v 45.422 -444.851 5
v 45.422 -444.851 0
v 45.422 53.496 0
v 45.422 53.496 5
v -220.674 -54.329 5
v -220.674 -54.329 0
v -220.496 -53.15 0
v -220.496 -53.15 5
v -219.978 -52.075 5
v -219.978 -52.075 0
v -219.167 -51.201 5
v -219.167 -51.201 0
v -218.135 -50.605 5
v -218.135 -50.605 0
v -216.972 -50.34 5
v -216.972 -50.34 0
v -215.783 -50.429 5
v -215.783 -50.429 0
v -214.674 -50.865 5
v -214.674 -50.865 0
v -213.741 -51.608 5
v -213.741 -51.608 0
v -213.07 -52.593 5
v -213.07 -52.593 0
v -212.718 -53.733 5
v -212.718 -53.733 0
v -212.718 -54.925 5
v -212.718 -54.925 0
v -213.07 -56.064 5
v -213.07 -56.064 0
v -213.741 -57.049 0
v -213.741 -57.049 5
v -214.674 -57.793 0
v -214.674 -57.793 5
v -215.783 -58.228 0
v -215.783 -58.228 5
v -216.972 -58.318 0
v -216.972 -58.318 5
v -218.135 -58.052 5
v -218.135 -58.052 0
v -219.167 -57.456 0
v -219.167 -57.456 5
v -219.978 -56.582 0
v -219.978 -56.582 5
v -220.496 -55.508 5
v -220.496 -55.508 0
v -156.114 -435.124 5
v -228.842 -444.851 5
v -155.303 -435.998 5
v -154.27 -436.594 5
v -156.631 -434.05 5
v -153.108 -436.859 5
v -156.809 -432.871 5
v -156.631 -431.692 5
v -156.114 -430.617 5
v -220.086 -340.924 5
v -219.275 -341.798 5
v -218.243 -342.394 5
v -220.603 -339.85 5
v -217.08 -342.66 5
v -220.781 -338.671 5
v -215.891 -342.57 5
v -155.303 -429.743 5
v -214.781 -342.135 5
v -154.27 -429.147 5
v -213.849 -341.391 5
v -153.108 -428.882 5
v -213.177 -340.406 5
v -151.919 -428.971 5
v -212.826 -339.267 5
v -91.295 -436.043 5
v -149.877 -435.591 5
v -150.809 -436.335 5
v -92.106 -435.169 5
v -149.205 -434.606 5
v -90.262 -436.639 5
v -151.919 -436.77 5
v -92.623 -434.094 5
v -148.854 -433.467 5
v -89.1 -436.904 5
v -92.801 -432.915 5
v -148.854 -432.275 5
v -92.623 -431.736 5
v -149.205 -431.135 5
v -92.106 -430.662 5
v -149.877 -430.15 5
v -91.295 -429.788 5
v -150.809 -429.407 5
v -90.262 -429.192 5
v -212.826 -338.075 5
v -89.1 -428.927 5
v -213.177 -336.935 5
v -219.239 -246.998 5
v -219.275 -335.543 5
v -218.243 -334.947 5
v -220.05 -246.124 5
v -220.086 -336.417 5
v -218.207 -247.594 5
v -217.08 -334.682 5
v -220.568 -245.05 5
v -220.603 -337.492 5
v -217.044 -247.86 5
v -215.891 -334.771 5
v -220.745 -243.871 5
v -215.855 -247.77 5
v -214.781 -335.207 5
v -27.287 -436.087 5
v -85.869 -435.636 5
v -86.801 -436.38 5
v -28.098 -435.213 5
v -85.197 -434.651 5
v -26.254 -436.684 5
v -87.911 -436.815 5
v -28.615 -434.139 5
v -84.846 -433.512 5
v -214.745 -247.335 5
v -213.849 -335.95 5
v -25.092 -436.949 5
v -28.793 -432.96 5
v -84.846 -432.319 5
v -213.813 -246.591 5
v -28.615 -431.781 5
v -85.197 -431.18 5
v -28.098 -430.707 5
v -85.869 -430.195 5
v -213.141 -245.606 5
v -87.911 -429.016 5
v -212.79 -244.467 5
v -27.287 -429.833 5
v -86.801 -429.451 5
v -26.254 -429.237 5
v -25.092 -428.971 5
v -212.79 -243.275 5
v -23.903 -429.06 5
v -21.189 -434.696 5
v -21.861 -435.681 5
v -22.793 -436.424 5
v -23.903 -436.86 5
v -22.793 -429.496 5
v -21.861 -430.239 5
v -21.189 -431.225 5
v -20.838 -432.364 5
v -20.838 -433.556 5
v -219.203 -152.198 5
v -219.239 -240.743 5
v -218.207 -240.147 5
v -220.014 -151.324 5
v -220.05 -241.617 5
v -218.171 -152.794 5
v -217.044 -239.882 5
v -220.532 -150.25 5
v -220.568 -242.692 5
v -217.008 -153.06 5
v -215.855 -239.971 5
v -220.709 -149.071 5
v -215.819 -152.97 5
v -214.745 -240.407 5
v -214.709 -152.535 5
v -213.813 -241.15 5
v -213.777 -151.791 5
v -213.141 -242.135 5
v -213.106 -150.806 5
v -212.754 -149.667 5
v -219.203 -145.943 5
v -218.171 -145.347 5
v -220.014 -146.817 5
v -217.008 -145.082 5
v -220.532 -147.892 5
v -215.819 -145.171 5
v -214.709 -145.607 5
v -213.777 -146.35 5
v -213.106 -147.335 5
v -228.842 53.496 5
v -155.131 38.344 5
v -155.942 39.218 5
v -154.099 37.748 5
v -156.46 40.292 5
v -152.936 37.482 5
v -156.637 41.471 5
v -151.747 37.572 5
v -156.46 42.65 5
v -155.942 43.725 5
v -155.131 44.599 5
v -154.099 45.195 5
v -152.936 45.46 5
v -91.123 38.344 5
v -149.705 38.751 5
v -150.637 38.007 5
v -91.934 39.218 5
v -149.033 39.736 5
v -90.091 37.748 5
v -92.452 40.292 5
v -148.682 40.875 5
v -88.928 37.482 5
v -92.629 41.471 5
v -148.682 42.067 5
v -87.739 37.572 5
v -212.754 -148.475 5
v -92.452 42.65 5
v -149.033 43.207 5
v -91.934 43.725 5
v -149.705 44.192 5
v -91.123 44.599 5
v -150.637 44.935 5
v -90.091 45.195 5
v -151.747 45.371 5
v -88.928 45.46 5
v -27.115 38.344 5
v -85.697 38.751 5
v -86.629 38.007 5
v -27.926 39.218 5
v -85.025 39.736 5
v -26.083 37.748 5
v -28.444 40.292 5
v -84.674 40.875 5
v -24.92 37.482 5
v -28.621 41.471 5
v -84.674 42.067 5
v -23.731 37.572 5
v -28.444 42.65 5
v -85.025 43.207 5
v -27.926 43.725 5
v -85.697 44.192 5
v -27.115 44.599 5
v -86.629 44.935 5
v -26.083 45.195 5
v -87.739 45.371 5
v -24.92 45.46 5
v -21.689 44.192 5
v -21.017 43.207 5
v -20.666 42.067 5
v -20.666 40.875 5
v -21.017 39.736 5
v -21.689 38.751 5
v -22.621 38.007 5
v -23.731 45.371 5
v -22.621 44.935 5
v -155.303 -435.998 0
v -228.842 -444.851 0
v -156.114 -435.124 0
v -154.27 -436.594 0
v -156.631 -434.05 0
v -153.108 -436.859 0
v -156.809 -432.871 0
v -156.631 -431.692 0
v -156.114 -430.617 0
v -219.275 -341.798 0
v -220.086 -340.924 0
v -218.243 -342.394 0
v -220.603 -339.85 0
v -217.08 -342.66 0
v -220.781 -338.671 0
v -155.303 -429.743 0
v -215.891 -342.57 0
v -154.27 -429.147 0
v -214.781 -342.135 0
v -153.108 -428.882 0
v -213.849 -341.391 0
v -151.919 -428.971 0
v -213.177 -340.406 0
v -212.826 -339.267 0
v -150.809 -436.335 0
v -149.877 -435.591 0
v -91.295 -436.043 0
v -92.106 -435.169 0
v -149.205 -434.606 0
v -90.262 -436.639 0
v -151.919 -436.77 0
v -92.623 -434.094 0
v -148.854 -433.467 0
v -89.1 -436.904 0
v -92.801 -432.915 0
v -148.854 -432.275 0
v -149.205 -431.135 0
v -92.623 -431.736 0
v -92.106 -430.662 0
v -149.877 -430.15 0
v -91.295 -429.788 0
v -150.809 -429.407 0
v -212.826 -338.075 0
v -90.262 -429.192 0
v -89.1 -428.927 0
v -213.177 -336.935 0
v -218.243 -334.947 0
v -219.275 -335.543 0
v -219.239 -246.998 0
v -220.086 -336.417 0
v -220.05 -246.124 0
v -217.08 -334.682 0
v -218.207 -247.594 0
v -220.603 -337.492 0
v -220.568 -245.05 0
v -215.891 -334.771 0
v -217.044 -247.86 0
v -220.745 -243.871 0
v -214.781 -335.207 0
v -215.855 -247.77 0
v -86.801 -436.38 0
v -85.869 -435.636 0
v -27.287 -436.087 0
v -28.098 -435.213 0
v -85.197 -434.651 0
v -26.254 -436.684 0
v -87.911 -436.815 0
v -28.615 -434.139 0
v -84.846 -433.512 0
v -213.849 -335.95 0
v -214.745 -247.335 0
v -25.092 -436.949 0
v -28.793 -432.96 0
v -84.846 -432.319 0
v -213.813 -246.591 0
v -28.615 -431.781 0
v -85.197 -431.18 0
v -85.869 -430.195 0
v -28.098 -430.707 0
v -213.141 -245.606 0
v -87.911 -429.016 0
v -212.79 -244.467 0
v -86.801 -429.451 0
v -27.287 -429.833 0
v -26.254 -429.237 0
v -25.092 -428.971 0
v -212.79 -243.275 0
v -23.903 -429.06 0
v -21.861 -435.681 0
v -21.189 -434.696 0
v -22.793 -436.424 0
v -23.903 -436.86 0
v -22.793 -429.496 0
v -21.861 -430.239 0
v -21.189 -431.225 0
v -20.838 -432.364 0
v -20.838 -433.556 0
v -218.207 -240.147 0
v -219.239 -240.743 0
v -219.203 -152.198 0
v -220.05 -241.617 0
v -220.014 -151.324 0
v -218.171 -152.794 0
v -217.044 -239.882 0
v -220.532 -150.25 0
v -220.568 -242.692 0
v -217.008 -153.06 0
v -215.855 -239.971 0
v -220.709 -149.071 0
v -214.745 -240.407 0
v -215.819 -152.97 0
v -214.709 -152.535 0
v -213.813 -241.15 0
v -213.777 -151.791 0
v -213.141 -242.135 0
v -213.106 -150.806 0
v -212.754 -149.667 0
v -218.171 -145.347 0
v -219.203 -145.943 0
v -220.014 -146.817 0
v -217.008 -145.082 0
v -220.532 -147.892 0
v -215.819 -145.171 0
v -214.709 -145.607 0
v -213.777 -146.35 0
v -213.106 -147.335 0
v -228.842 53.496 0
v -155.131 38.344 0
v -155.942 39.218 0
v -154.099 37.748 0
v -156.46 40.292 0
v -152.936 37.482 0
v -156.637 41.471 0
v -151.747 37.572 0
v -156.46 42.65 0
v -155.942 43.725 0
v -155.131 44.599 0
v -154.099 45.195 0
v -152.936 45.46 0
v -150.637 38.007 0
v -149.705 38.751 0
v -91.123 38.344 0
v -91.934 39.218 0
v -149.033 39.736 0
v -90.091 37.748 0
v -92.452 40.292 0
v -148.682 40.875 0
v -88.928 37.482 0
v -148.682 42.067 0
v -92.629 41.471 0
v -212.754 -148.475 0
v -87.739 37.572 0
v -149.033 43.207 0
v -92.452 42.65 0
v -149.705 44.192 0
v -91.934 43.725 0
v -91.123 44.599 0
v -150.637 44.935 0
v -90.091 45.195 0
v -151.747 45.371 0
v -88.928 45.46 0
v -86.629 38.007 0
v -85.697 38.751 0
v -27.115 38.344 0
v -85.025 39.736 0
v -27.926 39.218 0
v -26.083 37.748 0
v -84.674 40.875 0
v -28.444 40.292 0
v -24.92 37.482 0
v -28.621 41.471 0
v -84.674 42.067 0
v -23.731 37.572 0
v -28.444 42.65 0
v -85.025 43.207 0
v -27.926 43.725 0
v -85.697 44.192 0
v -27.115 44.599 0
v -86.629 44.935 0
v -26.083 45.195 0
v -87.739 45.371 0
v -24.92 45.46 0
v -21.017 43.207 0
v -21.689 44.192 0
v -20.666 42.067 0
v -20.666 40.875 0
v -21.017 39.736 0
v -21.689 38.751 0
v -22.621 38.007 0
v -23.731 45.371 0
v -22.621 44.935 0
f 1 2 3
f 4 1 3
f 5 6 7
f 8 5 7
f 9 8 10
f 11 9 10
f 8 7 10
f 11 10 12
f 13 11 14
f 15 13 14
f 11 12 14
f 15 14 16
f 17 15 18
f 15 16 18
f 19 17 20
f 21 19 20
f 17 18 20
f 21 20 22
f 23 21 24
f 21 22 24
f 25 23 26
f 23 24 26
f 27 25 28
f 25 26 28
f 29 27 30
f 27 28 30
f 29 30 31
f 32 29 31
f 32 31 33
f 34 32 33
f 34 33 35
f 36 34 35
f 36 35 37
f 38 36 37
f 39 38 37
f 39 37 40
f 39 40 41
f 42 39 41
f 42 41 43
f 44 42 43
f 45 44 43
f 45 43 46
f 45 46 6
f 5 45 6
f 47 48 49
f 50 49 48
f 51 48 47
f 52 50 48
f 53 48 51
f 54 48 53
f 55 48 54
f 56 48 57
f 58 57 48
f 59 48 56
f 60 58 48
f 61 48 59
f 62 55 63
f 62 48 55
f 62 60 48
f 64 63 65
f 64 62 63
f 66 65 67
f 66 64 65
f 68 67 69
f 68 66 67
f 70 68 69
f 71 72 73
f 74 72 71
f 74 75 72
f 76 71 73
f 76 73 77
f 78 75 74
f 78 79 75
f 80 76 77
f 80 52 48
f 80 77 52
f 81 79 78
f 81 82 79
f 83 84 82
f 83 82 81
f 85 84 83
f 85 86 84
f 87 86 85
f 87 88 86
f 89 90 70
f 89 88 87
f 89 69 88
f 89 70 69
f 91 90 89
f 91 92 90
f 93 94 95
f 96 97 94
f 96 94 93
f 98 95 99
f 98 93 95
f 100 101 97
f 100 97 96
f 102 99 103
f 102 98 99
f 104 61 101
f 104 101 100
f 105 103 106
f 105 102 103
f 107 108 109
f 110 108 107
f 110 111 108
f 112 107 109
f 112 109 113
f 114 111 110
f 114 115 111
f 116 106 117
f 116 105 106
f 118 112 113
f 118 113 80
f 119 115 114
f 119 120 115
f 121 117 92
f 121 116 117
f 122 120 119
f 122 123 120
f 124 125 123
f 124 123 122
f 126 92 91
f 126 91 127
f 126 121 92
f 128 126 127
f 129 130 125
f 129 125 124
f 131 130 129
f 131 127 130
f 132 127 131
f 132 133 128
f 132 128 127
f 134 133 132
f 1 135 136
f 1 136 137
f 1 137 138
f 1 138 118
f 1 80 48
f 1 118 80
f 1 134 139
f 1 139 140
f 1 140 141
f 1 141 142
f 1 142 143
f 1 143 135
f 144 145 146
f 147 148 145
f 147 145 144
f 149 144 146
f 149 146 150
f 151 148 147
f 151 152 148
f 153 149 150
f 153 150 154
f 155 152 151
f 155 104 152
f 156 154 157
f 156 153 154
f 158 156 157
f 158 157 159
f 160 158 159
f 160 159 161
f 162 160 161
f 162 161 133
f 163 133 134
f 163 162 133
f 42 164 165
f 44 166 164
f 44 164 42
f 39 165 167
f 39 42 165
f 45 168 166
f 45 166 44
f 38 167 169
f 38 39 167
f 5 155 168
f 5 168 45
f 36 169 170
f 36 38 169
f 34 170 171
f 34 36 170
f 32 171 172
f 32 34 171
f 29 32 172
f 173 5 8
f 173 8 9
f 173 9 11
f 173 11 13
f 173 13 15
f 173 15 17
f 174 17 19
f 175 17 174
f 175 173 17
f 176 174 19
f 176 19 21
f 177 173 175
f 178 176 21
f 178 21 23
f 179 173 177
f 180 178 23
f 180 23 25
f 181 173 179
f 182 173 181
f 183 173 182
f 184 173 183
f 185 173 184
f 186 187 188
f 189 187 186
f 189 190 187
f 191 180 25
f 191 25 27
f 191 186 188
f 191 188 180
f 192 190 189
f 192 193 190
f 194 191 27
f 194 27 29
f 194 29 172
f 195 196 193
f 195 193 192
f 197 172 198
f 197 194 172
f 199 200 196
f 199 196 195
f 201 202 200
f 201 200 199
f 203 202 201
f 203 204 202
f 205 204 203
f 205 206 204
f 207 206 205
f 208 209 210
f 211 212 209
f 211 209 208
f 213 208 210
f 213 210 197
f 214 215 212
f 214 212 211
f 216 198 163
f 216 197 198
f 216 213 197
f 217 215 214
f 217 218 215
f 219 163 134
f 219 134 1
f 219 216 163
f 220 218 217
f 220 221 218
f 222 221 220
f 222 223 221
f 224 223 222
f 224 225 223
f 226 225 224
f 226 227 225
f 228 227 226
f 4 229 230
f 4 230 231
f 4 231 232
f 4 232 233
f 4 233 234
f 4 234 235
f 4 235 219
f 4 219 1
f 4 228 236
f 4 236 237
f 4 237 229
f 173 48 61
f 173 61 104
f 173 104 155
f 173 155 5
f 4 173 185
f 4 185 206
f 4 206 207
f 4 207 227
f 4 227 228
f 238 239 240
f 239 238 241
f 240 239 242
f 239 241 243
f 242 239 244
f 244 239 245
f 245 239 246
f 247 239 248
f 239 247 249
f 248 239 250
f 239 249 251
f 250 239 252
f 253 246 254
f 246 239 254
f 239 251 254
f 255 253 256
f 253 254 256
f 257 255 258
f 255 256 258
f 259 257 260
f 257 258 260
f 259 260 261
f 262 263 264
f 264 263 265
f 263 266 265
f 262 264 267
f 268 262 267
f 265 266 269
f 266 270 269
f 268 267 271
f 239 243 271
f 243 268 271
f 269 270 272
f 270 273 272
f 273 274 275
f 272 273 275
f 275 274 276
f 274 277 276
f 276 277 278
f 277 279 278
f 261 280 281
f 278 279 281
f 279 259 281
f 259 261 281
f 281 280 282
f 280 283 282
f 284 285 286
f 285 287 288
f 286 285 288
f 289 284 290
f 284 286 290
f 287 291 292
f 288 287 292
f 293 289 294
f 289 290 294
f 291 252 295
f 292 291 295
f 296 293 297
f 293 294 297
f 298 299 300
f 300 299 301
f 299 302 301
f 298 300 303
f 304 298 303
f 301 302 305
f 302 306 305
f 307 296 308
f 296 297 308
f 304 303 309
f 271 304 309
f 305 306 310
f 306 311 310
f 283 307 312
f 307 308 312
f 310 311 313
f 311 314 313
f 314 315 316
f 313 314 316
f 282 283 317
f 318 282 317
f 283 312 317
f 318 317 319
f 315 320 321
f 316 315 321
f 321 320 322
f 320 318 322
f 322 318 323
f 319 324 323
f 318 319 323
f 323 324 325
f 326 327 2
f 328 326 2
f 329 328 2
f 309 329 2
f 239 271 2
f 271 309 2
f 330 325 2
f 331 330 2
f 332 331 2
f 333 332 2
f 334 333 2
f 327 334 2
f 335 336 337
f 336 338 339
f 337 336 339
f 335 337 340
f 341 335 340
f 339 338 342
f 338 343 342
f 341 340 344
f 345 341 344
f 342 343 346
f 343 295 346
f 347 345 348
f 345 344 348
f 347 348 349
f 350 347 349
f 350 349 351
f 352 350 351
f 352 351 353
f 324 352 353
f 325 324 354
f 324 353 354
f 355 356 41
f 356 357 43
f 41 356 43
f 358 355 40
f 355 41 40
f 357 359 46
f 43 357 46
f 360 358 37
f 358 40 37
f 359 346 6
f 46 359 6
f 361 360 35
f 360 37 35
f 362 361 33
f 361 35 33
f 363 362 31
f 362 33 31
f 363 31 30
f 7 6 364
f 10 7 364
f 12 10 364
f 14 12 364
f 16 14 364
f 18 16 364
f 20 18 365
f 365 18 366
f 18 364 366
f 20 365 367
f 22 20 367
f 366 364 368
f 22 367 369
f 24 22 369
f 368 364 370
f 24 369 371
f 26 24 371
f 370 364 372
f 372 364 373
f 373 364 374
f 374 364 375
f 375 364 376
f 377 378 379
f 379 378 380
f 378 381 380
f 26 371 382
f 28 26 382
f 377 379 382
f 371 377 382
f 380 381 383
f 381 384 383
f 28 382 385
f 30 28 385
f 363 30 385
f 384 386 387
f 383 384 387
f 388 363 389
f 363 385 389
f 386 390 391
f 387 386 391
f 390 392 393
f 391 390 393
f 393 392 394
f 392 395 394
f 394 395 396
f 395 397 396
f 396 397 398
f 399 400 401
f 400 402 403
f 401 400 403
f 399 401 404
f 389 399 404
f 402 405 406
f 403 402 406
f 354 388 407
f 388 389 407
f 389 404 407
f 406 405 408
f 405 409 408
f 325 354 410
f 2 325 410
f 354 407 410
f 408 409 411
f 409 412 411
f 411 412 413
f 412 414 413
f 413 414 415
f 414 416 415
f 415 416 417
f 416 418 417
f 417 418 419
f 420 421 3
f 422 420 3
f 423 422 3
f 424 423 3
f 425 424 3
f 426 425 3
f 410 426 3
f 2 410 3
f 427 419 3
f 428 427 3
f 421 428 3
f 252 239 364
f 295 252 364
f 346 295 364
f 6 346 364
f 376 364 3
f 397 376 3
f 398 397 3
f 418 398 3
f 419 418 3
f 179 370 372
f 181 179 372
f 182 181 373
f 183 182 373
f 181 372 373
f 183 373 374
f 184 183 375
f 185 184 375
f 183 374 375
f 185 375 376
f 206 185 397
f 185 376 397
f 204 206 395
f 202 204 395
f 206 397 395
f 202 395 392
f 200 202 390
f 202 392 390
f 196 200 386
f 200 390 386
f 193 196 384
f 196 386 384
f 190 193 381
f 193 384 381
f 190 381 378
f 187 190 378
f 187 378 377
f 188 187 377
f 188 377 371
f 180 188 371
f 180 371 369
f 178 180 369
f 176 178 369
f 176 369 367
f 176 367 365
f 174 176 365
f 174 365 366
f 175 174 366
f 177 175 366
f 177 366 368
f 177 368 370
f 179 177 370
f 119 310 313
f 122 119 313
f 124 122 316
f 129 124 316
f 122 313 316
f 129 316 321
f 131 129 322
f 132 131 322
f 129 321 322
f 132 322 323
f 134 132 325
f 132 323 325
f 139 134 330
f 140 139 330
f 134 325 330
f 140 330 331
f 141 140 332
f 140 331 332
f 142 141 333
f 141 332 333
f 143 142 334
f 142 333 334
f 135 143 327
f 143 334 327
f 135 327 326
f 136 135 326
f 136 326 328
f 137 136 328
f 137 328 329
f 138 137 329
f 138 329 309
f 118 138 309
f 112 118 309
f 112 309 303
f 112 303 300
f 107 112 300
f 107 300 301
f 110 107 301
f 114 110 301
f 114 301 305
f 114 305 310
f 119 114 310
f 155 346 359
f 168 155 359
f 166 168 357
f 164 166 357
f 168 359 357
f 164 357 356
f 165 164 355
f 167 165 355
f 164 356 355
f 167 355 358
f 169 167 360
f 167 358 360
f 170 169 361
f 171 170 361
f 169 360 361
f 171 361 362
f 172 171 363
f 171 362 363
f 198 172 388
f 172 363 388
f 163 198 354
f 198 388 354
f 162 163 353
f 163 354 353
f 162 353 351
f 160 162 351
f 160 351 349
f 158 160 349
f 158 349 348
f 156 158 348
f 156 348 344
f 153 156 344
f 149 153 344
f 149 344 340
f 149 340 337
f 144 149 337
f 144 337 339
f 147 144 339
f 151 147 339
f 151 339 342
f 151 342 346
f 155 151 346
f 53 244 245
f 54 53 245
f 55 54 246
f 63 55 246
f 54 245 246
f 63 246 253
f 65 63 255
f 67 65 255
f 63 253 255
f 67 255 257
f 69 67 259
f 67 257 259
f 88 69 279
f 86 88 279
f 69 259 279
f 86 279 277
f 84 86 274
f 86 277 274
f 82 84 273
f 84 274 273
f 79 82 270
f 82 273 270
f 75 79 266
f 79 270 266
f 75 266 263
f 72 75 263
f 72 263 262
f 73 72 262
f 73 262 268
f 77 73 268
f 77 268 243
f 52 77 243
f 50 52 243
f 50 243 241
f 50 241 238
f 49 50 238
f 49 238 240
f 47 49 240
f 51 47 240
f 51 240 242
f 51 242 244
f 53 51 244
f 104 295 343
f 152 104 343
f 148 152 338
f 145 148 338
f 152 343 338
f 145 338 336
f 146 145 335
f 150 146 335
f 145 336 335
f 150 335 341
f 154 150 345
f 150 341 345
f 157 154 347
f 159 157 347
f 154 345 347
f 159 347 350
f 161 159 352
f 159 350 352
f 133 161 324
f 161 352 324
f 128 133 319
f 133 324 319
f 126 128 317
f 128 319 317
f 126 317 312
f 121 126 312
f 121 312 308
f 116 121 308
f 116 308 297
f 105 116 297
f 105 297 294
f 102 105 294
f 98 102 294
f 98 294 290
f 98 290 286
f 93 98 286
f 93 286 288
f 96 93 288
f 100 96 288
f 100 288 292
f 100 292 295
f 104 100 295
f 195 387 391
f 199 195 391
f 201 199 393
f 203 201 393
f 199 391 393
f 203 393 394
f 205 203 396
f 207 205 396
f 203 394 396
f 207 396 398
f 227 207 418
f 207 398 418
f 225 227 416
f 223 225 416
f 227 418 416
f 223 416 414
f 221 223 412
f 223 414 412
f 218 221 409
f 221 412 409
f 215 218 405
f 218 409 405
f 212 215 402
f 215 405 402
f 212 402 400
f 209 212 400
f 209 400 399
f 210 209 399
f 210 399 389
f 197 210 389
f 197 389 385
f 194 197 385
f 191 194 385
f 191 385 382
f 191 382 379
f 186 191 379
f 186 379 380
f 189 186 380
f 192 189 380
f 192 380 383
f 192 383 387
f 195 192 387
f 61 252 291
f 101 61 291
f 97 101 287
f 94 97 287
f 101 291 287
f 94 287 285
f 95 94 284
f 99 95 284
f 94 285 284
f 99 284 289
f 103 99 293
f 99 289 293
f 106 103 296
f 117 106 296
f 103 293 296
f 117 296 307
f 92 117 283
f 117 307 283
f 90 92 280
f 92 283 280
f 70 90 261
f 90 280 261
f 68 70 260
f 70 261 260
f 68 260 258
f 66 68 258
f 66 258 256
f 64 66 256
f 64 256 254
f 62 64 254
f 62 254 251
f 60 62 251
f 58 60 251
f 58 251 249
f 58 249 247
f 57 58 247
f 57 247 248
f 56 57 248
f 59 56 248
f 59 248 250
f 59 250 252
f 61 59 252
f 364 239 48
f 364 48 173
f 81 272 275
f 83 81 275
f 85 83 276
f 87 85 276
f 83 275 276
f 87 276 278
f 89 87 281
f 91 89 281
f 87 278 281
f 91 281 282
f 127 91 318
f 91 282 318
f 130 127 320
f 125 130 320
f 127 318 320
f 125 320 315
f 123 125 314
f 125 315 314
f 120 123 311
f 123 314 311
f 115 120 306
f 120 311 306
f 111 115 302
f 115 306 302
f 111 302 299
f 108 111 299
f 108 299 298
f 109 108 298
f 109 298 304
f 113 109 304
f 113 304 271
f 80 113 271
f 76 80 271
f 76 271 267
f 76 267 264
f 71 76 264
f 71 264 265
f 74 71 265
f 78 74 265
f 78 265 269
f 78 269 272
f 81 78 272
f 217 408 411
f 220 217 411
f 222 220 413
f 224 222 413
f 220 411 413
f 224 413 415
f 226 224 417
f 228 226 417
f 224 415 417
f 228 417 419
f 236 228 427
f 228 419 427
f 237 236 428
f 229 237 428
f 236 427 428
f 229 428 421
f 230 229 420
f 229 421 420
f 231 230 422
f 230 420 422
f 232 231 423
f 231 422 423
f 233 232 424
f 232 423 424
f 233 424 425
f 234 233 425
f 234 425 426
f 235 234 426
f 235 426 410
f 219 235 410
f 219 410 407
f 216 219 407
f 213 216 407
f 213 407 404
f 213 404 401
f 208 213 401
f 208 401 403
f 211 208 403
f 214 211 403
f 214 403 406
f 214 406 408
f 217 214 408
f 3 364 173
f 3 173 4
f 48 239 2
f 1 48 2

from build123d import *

# Parameters (mm, degrees)
BASE_FLANGE1_OUTLINE_W = 274.2634
BASE_FLANGE1_OUTLINE_H = 498.347194877
BASE_FLANGE1_DEPTH     = 5
CUT_EXTRUDE1_REACH     = 502.286
SKETCH6_R              = 4


# Read off the part's stored shape, not the designer's step: Base-Flange1
with BuildPart() as part:
    # Base-Flange1 outline → Base-Flange1 (new body)
    with BuildSketch(Plane.XY):
        with Locations((-91.710148042, -195.677360812)):
            Rectangle(BASE_FLANGE1_OUTLINE_W, BASE_FLANGE1_OUTLINE_H)
    extrude(amount=BASE_FLANGE1_DEPTH)

    # Sketch6 → Cut-Extrude1 (cut, up to next)
    with BuildSketch(Plane(origin=(0, 0, 0), x_dir=(-1, 0, 0), z_dir=(0, 0, -1)), mode=Mode.PRIVATE) as cut_extrude1_sk1:
        with Locations((152.63724292, 41.471236627)):
            Circle(SKETCH6_R)
    cut_extrude1_tool1 = extrude(cut_extrude1_sk1.sketch, amount=-CUT_EXTRUDE1_REACH, mode=Mode.PRIVATE) & part.part
    # Sketch6 → Cut-Extrude1 (cut, up to next)
    with BuildSketch(Plane(origin=(0, 0, 0), x_dir=(-1, 0, 0), z_dir=(0, 0, -1)), mode=Mode.PRIVATE) as cut_extrude1_sk2:
        with Locations((88.62924292, 41.471236627)):
            Circle(SKETCH6_R)
    cut_extrude1_tool2 = extrude(cut_extrude1_sk2.sketch, amount=-CUT_EXTRUDE1_REACH, mode=Mode.PRIVATE) & part.part
    # Sketch6 → Cut-Extrude1 (cut, up to next)
    with BuildSketch(Plane(origin=(0, 0, 0), x_dir=(-1, 0, 0), z_dir=(0, 0, -1)), mode=Mode.PRIVATE) as cut_extrude1_sk3:
        with Locations((24.62124292, 41.471236627)):
            Circle(SKETCH6_R)
    cut_extrude1_tool3 = extrude(cut_extrude1_sk3.sketch, amount=-CUT_EXTRUDE1_REACH, mode=Mode.PRIVATE) & part.part
    # Sketch6 → Cut-Extrude1 (cut, up to next)
    with BuildSketch(Plane(origin=(0, 0, 0), x_dir=(-1, 0, 0), z_dir=(0, 0, -1)), mode=Mode.PRIVATE) as cut_extrude1_sk4:
        with Locations((216.673520112, -54.328763373)):
            Circle(SKETCH6_R)
    cut_extrude1_tool4 = extrude(cut_extrude1_sk4.sketch, amount=-CUT_EXTRUDE1_REACH, mode=Mode.PRIVATE) & part.part
    # Sketch6 → Cut-Extrude1 (cut, up to next)
    with BuildSketch(Plane(origin=(0, 0, 0), x_dir=(-1, 0, 0), z_dir=(0, 0, -1)), mode=Mode.PRIVATE) as cut_extrude1_sk5:
        with Locations((216.709396665, -149.070763373)):
            Circle(SKETCH6_R)
    cut_extrude1_tool5 = extrude(cut_extrude1_sk5.sketch, amount=-CUT_EXTRUDE1_REACH, mode=Mode.PRIVATE) & part.part
    # Sketch6 → Cut-Extrude1 (cut, up to next)
    with BuildSketch(Plane(origin=(0, 0, 0), x_dir=(-1, 0, 0), z_dir=(0, 0, -1)), mode=Mode.PRIVATE) as cut_extrude1_sk6:
        with Locations((216.745295182, -243.870763373)):
            Circle(SKETCH6_R)
    cut_extrude1_tool6 = extrude(cut_extrude1_sk6.sketch, amount=-CUT_EXTRUDE1_REACH, mode=Mode.PRIVATE) & part.part
    # Sketch6 → Cut-Extrude1 (cut, up to next)
    with BuildSketch(Plane(origin=(0, 0, 0), x_dir=(-1, 0, 0), z_dir=(0, 0, -1)), mode=Mode.PRIVATE) as cut_extrude1_sk7:
        with Locations((216.781193698, -338.670763373)):
            Circle(SKETCH6_R)
    cut_extrude1_tool7 = extrude(cut_extrude1_sk7.sketch, amount=-CUT_EXTRUDE1_REACH, mode=Mode.PRIVATE) & part.part
    # Sketch6 → Cut-Extrude1 (cut, up to next)
    with BuildSketch(Plane(origin=(0, 0, 0), x_dir=(-1, 0, 0), z_dir=(0, 0, -1)), mode=Mode.PRIVATE) as cut_extrude1_sk8:
        with Locations((152.808848042, -432.870680177)):
            Circle(SKETCH6_R)
    cut_extrude1_tool8 = extrude(cut_extrude1_sk8.sketch, amount=-CUT_EXTRUDE1_REACH, mode=Mode.PRIVATE) & part.part
    # Sketch6 → Cut-Extrude1 (cut, up to next)
    with BuildSketch(Plane(origin=(0, 0, 0), x_dir=(-1, 0, 0), z_dir=(0, 0, -1)), mode=Mode.PRIVATE) as cut_extrude1_sk9:
        with Locations((88.800848042, -432.915402104)):
            Circle(SKETCH6_R)
    cut_extrude1_tool9 = extrude(cut_extrude1_sk9.sketch, amount=-CUT_EXTRUDE1_REACH, mode=Mode.PRIVATE) & part.part
    # Sketch6 → Cut-Extrude1 (cut, up to next)
    with BuildSketch(Plane(origin=(0, 0, 0), x_dir=(-1, 0, 0), z_dir=(0, 0, -1)), mode=Mode.PRIVATE) as cut_extrude1_sk10:
        with Locations((24.792848042, -432.960124031)):
            Circle(SKETCH6_R)
    cut_extrude1_tool10 = extrude(cut_extrude1_sk10.sketch, amount=-CUT_EXTRUDE1_REACH, mode=Mode.PRIVATE) & part.part
    add(cut_extrude1_tool1.solids().sort_by_distance((-152.637243, 41.471237, 0))[0], mode=Mode.SUBTRACT)
    add(cut_extrude1_tool2.solids().sort_by_distance((-88.629243, 41.471237, 0))[0], mode=Mode.SUBTRACT)
    add(cut_extrude1_tool3.solids().sort_by_distance((-24.621243, 41.471237, 0))[0], mode=Mode.SUBTRACT)
    add(cut_extrude1_tool4.solids().sort_by_distance((-216.67352, -54.328763, 0))[0], mode=Mode.SUBTRACT)
    add(cut_extrude1_tool5.solids().sort_by_distance((-216.709397, -149.070763, 0))[0], mode=Mode.SUBTRACT)
    add(cut_extrude1_tool6.solids().sort_by_distance((-216.745295, -243.870763, 0))[0], mode=Mode.SUBTRACT)
    add(cut_extrude1_tool7.solids().sort_by_distance((-216.781194, -338.670763, 0))[0], mode=Mode.SUBTRACT)
    add(cut_extrude1_tool8.solids().sort_by_distance((-152.808848, -432.87068, 0))[0], mode=Mode.SUBTRACT)
    add(cut_extrude1_tool9.solids().sort_by_distance((-88.800848, -432.915402, 0))[0], mode=Mode.SUBTRACT)
    add(cut_extrude1_tool10.solids().sort_by_distance((-24.792848, -432.960124, 0))[0], mode=Mode.SUBTRACT)


solid = part.part
